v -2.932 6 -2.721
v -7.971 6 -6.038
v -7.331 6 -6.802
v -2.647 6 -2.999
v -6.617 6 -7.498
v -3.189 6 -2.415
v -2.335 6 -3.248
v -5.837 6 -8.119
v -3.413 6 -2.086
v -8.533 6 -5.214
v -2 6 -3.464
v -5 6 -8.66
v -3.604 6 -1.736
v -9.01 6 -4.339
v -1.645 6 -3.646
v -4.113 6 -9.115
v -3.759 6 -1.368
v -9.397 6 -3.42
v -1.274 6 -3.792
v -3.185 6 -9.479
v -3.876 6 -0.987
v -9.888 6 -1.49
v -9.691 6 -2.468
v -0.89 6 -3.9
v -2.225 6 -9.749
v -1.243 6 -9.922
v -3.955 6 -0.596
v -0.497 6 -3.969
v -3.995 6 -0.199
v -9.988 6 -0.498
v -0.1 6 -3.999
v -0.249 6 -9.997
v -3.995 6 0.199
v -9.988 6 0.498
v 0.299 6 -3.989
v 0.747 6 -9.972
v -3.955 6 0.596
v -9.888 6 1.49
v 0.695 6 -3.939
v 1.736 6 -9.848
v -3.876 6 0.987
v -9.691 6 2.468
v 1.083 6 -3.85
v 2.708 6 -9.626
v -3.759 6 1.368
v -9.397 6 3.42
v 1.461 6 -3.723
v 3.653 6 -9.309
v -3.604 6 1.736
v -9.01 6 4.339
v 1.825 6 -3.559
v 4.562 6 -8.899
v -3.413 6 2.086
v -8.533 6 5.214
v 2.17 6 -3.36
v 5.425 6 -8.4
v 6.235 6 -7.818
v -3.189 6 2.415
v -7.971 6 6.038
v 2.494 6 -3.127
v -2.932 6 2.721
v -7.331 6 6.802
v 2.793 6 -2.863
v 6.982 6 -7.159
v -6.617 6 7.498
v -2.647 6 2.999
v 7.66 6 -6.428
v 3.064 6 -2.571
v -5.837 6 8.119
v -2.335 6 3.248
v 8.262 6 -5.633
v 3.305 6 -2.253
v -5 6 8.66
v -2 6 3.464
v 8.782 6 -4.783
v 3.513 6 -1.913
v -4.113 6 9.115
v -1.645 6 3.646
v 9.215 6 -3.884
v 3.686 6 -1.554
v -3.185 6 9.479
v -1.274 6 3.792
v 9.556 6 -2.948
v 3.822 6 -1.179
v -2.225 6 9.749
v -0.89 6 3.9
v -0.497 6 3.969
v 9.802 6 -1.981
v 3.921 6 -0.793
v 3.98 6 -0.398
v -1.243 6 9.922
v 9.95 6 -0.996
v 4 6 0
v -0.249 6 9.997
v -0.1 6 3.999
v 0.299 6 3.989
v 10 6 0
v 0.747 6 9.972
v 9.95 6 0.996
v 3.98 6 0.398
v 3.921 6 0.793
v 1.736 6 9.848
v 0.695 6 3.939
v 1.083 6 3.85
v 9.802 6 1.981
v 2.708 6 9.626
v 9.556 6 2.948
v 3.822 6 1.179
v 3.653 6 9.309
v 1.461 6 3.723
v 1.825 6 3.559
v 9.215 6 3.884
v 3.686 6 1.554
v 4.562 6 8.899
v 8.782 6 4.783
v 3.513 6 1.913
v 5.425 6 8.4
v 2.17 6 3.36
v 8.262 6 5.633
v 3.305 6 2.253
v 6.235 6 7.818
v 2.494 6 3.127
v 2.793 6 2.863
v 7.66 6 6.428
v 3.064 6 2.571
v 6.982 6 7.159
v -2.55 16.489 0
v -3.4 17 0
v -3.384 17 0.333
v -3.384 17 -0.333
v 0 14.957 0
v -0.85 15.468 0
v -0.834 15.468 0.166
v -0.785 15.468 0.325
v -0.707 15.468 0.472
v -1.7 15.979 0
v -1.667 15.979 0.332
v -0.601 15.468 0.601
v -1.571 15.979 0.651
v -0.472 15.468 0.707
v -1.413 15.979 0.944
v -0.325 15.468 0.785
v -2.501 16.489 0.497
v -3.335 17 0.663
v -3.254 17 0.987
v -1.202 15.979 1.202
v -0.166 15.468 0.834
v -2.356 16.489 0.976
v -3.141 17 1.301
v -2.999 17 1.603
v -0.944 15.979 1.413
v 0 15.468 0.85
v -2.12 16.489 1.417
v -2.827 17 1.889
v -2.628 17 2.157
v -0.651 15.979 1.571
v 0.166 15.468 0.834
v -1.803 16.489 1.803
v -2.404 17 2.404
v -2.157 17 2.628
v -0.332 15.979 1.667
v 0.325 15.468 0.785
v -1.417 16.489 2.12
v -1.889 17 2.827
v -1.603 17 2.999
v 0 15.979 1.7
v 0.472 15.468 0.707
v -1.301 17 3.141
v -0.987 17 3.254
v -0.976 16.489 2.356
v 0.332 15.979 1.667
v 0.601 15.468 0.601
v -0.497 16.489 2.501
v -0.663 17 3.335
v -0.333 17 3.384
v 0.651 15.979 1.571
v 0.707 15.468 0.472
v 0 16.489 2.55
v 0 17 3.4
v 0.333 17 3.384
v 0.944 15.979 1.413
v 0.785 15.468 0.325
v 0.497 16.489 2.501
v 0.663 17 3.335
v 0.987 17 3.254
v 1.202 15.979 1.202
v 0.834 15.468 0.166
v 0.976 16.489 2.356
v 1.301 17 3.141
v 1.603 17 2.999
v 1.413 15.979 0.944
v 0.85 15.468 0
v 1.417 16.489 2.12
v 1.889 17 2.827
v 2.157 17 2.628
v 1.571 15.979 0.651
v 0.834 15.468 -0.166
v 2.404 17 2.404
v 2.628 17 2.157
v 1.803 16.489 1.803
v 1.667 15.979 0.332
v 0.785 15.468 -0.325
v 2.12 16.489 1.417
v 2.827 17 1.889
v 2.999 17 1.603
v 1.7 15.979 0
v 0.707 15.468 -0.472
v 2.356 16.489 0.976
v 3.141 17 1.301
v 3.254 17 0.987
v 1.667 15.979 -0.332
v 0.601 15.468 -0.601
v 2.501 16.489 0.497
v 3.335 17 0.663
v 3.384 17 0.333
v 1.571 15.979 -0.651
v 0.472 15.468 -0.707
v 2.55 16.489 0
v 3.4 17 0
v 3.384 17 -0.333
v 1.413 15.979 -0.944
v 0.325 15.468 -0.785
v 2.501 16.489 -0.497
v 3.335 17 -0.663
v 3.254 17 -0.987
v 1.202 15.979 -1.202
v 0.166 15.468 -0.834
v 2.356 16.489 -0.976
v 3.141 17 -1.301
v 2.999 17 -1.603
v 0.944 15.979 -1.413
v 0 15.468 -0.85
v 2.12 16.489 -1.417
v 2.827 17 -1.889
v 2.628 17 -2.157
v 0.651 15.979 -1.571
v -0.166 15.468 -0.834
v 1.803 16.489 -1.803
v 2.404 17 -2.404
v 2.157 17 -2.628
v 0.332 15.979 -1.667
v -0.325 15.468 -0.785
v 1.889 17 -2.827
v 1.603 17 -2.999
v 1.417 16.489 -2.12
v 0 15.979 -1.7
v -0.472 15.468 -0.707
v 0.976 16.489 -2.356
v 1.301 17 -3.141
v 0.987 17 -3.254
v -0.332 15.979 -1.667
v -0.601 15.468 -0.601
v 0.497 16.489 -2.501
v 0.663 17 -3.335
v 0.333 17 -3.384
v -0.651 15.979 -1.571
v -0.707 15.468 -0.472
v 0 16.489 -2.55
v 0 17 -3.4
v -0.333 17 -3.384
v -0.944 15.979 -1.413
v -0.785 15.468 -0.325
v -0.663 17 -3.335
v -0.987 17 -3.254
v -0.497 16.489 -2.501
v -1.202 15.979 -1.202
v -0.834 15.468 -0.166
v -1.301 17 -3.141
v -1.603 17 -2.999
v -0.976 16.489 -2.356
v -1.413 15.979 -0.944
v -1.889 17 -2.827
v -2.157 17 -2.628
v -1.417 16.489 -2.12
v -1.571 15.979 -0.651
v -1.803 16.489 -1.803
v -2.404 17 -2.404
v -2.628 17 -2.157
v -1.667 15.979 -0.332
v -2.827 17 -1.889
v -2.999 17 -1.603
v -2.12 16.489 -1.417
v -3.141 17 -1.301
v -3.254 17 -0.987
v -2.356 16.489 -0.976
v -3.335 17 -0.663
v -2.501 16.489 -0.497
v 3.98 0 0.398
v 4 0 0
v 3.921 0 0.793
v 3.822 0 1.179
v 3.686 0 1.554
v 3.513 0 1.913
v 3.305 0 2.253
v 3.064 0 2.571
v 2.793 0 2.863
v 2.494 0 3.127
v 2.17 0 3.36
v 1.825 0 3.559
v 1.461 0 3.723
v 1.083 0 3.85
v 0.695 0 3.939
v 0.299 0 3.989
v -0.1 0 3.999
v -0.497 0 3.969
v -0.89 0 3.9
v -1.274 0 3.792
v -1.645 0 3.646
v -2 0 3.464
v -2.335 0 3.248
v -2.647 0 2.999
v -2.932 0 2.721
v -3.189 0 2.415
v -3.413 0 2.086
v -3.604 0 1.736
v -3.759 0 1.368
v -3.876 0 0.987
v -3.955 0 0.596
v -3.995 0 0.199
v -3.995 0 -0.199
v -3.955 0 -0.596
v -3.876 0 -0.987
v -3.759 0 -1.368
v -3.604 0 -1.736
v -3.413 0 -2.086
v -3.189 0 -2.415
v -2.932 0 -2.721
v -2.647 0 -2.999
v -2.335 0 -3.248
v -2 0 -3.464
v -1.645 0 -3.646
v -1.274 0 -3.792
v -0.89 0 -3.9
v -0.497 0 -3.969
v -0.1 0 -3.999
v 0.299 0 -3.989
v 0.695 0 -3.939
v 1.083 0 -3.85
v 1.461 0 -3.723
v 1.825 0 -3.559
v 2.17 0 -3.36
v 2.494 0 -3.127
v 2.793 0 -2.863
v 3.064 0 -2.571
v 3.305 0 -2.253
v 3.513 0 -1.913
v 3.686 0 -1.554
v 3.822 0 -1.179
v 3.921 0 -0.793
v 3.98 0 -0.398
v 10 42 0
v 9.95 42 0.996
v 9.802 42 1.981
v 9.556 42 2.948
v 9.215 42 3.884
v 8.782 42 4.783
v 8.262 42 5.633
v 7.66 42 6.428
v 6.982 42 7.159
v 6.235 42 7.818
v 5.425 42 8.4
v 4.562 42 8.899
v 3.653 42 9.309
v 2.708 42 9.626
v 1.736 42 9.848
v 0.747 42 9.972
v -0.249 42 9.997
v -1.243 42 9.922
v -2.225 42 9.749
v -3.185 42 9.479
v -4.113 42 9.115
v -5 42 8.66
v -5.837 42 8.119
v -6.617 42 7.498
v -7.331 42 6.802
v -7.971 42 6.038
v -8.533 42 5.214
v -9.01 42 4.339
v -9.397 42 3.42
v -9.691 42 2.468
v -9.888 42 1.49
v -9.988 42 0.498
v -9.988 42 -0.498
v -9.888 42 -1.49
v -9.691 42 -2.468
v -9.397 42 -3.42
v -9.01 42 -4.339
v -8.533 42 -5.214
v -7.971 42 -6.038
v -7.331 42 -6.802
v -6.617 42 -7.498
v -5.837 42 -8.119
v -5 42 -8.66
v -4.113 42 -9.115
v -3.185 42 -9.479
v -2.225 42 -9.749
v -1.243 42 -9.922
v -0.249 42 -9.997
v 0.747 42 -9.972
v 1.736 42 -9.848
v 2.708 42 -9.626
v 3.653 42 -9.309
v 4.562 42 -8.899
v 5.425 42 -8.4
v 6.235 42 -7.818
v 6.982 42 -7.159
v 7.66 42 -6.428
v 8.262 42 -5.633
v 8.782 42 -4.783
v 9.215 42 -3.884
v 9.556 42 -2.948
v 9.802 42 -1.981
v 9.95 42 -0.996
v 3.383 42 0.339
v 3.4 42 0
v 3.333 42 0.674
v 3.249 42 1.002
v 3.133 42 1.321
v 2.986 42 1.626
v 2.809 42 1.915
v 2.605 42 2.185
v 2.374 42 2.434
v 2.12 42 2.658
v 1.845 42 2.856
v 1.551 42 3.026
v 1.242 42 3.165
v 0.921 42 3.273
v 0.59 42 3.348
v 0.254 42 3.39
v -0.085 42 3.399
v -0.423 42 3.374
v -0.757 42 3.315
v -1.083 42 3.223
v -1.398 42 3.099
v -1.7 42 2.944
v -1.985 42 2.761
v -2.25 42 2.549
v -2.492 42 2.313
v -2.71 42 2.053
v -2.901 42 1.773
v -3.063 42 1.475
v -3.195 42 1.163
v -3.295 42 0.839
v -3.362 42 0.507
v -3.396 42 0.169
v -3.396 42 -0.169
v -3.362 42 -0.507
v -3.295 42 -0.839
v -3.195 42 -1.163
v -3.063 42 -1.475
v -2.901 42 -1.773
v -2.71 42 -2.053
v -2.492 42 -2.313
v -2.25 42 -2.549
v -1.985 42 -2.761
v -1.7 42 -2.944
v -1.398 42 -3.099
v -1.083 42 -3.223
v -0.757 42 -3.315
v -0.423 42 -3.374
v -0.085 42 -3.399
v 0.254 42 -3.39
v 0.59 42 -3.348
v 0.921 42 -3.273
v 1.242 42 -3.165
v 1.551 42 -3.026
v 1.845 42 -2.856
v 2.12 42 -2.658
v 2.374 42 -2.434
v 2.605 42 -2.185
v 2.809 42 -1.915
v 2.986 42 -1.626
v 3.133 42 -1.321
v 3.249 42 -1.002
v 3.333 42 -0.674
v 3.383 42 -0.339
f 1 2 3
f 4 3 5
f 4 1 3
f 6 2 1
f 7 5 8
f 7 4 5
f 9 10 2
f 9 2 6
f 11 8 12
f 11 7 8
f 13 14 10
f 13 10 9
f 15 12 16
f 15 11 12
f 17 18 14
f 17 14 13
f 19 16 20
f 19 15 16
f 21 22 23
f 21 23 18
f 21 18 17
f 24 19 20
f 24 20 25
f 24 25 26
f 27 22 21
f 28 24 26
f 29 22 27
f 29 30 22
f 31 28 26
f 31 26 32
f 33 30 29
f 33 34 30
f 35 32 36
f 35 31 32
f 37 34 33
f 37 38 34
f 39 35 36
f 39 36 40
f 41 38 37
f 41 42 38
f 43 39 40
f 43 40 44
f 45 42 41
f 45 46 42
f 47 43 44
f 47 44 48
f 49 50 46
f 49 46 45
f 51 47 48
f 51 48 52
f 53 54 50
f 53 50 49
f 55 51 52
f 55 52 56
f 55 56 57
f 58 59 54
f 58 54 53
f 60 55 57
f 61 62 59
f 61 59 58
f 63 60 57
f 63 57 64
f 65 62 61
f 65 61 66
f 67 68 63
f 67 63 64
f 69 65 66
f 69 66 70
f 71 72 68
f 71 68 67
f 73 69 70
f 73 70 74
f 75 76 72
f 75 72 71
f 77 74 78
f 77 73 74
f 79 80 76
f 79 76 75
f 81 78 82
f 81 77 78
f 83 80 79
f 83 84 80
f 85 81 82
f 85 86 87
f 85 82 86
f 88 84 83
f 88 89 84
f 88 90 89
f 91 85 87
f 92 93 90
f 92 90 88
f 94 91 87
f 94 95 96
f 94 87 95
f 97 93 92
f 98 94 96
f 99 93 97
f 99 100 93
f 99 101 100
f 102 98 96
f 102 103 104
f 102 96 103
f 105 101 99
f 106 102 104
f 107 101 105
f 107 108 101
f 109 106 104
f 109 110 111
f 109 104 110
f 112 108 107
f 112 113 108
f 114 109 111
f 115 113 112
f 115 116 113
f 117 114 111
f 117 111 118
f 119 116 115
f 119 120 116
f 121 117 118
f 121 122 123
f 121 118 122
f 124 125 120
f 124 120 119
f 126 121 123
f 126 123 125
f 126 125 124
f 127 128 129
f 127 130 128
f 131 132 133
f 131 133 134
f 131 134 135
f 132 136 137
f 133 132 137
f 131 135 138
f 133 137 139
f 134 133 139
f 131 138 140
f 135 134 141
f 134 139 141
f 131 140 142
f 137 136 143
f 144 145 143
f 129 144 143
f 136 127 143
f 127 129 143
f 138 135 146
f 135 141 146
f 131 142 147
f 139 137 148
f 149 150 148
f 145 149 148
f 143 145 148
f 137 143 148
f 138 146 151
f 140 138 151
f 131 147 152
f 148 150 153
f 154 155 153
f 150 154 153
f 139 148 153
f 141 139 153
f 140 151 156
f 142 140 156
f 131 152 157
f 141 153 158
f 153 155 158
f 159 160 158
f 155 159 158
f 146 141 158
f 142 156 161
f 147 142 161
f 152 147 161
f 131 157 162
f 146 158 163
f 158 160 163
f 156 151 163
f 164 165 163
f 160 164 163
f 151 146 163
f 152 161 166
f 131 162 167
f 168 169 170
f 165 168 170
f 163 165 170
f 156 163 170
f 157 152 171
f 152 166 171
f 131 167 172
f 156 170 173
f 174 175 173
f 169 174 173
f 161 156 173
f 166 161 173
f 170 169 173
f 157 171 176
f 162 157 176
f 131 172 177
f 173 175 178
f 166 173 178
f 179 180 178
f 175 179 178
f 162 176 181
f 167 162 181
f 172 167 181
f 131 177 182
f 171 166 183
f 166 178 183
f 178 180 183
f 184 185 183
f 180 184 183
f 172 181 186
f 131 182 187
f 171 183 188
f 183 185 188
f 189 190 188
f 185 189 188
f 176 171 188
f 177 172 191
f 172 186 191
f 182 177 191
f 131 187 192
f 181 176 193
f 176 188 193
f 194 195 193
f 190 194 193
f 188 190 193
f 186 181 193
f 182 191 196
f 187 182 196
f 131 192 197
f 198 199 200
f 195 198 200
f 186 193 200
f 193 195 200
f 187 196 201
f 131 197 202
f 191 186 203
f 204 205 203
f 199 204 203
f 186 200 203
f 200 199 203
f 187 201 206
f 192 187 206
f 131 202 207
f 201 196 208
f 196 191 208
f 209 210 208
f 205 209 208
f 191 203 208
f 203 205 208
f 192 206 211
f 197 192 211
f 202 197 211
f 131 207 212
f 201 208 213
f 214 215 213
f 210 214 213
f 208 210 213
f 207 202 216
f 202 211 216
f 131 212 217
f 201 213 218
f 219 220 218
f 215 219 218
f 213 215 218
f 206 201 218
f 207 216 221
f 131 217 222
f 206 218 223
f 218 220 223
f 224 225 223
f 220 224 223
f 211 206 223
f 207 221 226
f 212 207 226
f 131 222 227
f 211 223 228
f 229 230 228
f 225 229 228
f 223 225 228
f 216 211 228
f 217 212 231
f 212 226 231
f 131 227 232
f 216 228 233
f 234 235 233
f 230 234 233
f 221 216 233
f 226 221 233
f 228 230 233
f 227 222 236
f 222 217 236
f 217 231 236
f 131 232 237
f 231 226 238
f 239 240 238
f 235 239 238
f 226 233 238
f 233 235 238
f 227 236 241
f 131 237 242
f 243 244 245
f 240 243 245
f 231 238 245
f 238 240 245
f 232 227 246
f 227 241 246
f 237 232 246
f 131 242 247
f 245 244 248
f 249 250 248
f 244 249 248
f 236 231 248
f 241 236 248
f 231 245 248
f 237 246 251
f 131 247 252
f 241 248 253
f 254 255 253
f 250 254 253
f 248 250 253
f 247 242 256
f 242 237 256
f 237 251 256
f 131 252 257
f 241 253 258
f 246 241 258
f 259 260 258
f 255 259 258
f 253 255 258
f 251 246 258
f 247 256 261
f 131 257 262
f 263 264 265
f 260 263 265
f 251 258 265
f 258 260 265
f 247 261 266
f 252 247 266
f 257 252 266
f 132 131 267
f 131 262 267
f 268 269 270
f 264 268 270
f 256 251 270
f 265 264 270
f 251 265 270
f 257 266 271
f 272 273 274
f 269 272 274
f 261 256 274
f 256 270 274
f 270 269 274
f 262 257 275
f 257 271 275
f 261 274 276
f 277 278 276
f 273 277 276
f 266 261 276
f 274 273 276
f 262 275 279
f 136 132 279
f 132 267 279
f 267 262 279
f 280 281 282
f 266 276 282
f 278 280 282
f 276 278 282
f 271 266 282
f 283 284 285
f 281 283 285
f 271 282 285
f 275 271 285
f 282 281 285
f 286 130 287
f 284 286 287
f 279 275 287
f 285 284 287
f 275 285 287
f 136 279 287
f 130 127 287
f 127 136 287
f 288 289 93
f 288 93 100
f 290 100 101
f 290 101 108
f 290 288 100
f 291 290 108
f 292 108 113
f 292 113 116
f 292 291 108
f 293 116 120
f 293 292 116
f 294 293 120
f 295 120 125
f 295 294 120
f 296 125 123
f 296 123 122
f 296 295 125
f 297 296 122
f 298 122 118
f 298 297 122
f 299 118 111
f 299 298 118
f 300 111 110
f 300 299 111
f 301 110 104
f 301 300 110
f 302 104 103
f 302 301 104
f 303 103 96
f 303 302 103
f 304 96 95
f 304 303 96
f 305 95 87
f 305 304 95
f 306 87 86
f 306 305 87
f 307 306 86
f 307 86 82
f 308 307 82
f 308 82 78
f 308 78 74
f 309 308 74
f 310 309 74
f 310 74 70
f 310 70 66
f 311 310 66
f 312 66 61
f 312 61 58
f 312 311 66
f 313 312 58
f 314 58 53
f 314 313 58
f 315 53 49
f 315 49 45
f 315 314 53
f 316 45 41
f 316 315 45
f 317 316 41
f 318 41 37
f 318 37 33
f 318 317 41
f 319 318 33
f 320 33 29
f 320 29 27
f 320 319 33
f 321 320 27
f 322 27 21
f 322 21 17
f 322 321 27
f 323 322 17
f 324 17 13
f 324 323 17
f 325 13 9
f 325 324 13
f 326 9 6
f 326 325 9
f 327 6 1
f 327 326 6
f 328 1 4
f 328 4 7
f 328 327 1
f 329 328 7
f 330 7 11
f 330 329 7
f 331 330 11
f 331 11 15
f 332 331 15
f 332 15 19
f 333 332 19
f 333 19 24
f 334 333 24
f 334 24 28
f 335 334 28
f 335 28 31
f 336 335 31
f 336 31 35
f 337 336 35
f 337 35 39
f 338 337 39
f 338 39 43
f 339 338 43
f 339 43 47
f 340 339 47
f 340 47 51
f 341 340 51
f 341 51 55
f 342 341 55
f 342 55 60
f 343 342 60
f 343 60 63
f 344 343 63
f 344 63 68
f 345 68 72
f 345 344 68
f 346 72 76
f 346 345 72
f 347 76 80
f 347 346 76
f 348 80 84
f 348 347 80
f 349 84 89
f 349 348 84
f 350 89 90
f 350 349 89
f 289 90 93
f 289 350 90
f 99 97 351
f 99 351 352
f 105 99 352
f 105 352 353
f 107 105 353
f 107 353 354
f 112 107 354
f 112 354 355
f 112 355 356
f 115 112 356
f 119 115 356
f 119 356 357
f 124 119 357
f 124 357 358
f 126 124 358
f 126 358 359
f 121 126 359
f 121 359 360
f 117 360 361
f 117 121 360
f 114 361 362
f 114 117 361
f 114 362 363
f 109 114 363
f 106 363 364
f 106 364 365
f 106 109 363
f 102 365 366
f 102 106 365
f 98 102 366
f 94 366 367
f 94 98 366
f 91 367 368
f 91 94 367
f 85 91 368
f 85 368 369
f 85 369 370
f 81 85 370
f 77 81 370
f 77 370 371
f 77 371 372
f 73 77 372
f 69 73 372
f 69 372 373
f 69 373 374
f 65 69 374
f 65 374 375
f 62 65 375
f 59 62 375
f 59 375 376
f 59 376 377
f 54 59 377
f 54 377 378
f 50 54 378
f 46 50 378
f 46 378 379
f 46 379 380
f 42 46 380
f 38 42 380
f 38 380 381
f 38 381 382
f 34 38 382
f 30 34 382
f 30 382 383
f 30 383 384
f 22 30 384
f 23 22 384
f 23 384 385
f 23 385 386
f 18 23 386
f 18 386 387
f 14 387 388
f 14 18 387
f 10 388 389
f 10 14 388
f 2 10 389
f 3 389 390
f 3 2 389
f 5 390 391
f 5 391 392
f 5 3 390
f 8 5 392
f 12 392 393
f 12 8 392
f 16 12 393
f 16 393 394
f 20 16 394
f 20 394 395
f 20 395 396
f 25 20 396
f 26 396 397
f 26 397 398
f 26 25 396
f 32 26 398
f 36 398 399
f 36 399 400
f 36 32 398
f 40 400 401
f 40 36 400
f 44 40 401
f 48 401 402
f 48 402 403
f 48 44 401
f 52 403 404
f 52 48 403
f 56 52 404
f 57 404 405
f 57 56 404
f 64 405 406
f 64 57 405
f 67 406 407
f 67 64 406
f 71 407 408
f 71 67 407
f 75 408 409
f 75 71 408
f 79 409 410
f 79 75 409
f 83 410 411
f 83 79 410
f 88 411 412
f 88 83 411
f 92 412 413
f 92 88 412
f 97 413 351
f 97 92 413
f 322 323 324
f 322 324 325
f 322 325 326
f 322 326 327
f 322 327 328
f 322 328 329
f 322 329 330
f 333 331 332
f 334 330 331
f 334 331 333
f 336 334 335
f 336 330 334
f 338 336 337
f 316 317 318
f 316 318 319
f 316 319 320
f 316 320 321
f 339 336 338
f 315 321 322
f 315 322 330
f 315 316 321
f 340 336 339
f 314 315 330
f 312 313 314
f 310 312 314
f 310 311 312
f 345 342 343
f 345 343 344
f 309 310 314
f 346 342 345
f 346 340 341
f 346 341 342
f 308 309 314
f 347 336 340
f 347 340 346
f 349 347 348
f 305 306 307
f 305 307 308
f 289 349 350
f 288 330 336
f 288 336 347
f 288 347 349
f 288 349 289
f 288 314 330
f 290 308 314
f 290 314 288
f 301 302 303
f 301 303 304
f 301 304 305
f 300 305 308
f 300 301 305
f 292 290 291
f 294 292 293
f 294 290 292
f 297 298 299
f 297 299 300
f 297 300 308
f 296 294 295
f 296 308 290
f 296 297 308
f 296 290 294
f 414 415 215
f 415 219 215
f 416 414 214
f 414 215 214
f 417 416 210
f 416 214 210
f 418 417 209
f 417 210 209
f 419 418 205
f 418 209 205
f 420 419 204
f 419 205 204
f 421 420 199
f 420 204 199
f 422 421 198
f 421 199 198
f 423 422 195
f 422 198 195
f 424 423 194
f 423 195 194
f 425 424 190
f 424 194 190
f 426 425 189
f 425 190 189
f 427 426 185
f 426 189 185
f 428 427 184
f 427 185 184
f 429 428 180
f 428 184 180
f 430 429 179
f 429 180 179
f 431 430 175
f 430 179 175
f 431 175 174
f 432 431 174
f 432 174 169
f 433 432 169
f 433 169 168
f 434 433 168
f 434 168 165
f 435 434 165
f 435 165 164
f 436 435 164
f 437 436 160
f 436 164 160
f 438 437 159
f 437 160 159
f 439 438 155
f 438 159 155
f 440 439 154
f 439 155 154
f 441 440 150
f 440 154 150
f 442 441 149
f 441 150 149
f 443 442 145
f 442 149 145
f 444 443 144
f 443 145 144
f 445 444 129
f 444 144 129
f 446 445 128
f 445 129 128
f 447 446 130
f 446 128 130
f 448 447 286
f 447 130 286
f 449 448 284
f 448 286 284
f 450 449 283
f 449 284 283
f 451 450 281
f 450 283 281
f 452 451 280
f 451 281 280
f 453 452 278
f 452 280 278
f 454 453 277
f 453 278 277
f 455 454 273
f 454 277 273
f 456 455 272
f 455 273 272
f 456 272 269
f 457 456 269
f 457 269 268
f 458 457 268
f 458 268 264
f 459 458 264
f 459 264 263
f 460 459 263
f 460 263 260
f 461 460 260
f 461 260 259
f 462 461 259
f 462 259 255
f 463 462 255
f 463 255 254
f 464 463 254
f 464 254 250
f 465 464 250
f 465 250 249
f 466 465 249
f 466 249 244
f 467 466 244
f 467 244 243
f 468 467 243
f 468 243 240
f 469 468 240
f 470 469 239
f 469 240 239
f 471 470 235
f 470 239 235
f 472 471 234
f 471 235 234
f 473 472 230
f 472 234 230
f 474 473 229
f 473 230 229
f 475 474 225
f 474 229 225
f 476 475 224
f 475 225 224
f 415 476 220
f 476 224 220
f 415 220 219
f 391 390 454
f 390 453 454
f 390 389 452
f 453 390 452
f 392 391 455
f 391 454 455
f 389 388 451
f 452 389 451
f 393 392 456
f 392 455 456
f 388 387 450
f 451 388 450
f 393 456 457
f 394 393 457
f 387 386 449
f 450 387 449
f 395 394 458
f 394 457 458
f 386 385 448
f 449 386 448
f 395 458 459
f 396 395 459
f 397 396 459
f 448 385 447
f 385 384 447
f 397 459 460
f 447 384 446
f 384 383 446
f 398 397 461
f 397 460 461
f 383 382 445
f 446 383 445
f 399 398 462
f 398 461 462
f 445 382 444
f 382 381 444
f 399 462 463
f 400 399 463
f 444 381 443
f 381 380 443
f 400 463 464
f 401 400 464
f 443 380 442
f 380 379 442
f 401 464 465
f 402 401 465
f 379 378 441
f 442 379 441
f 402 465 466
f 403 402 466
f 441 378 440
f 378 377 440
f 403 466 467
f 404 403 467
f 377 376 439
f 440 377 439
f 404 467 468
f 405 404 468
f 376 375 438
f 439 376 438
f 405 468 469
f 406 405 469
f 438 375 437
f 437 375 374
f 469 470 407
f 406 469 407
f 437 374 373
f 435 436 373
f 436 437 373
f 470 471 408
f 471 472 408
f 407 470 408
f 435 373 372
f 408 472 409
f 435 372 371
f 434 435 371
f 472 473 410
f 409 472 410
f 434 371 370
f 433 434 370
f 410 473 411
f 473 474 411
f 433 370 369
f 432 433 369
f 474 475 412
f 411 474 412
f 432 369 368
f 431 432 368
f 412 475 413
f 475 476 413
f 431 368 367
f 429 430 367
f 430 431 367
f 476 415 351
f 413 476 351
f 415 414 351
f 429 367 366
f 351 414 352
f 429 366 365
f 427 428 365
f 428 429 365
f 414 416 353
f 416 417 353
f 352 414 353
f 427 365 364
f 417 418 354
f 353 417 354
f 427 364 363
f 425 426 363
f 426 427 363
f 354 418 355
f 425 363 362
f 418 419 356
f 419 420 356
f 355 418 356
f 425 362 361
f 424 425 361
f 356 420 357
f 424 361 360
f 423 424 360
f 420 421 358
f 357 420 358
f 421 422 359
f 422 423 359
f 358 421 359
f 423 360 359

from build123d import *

# Parameters (mm, degrees)
F0_R     = 10
F1_DEPTH = 42
F2_R     = 16.4716554
F2_R_2   = 4
F3_DEPTH = 6
F5_D     = 6.8
F5_DEPTH = 25
F5_TIP   = 2.0429261047


with BuildPart() as f1:
    # F0 (on Front) → F1 (new body)
    with BuildSketch(Plane.XZ):
        Circle(F0_R)
    extrude(amount=-F1_DEPTH)

    # F2 (on face) → F3 (cut)
    with BuildSketch(Plane.XZ):
        Circle(F2_R)
        Circle(F2_R_2, mode=Mode.SUBTRACT)
    extrude(amount=-F3_DEPTH, mode=Mode.SUBTRACT)

    # F5
    with Locations(Plane(origin=(0, 42, 0), x_dir=(-1, 0, 0), z_dir=(0, 1, 0))):
        with Locations((0, 0)):
            Hole(F5_D / 2, depth=F5_DEPTH)
            with Locations((0, 0, -(F5_DEPTH + F5_TIP / 2))):  # 118° drill point
                Cone(0, F5_D / 2, F5_TIP, mode=Mode.SUBTRACT)


solid = f1.part
